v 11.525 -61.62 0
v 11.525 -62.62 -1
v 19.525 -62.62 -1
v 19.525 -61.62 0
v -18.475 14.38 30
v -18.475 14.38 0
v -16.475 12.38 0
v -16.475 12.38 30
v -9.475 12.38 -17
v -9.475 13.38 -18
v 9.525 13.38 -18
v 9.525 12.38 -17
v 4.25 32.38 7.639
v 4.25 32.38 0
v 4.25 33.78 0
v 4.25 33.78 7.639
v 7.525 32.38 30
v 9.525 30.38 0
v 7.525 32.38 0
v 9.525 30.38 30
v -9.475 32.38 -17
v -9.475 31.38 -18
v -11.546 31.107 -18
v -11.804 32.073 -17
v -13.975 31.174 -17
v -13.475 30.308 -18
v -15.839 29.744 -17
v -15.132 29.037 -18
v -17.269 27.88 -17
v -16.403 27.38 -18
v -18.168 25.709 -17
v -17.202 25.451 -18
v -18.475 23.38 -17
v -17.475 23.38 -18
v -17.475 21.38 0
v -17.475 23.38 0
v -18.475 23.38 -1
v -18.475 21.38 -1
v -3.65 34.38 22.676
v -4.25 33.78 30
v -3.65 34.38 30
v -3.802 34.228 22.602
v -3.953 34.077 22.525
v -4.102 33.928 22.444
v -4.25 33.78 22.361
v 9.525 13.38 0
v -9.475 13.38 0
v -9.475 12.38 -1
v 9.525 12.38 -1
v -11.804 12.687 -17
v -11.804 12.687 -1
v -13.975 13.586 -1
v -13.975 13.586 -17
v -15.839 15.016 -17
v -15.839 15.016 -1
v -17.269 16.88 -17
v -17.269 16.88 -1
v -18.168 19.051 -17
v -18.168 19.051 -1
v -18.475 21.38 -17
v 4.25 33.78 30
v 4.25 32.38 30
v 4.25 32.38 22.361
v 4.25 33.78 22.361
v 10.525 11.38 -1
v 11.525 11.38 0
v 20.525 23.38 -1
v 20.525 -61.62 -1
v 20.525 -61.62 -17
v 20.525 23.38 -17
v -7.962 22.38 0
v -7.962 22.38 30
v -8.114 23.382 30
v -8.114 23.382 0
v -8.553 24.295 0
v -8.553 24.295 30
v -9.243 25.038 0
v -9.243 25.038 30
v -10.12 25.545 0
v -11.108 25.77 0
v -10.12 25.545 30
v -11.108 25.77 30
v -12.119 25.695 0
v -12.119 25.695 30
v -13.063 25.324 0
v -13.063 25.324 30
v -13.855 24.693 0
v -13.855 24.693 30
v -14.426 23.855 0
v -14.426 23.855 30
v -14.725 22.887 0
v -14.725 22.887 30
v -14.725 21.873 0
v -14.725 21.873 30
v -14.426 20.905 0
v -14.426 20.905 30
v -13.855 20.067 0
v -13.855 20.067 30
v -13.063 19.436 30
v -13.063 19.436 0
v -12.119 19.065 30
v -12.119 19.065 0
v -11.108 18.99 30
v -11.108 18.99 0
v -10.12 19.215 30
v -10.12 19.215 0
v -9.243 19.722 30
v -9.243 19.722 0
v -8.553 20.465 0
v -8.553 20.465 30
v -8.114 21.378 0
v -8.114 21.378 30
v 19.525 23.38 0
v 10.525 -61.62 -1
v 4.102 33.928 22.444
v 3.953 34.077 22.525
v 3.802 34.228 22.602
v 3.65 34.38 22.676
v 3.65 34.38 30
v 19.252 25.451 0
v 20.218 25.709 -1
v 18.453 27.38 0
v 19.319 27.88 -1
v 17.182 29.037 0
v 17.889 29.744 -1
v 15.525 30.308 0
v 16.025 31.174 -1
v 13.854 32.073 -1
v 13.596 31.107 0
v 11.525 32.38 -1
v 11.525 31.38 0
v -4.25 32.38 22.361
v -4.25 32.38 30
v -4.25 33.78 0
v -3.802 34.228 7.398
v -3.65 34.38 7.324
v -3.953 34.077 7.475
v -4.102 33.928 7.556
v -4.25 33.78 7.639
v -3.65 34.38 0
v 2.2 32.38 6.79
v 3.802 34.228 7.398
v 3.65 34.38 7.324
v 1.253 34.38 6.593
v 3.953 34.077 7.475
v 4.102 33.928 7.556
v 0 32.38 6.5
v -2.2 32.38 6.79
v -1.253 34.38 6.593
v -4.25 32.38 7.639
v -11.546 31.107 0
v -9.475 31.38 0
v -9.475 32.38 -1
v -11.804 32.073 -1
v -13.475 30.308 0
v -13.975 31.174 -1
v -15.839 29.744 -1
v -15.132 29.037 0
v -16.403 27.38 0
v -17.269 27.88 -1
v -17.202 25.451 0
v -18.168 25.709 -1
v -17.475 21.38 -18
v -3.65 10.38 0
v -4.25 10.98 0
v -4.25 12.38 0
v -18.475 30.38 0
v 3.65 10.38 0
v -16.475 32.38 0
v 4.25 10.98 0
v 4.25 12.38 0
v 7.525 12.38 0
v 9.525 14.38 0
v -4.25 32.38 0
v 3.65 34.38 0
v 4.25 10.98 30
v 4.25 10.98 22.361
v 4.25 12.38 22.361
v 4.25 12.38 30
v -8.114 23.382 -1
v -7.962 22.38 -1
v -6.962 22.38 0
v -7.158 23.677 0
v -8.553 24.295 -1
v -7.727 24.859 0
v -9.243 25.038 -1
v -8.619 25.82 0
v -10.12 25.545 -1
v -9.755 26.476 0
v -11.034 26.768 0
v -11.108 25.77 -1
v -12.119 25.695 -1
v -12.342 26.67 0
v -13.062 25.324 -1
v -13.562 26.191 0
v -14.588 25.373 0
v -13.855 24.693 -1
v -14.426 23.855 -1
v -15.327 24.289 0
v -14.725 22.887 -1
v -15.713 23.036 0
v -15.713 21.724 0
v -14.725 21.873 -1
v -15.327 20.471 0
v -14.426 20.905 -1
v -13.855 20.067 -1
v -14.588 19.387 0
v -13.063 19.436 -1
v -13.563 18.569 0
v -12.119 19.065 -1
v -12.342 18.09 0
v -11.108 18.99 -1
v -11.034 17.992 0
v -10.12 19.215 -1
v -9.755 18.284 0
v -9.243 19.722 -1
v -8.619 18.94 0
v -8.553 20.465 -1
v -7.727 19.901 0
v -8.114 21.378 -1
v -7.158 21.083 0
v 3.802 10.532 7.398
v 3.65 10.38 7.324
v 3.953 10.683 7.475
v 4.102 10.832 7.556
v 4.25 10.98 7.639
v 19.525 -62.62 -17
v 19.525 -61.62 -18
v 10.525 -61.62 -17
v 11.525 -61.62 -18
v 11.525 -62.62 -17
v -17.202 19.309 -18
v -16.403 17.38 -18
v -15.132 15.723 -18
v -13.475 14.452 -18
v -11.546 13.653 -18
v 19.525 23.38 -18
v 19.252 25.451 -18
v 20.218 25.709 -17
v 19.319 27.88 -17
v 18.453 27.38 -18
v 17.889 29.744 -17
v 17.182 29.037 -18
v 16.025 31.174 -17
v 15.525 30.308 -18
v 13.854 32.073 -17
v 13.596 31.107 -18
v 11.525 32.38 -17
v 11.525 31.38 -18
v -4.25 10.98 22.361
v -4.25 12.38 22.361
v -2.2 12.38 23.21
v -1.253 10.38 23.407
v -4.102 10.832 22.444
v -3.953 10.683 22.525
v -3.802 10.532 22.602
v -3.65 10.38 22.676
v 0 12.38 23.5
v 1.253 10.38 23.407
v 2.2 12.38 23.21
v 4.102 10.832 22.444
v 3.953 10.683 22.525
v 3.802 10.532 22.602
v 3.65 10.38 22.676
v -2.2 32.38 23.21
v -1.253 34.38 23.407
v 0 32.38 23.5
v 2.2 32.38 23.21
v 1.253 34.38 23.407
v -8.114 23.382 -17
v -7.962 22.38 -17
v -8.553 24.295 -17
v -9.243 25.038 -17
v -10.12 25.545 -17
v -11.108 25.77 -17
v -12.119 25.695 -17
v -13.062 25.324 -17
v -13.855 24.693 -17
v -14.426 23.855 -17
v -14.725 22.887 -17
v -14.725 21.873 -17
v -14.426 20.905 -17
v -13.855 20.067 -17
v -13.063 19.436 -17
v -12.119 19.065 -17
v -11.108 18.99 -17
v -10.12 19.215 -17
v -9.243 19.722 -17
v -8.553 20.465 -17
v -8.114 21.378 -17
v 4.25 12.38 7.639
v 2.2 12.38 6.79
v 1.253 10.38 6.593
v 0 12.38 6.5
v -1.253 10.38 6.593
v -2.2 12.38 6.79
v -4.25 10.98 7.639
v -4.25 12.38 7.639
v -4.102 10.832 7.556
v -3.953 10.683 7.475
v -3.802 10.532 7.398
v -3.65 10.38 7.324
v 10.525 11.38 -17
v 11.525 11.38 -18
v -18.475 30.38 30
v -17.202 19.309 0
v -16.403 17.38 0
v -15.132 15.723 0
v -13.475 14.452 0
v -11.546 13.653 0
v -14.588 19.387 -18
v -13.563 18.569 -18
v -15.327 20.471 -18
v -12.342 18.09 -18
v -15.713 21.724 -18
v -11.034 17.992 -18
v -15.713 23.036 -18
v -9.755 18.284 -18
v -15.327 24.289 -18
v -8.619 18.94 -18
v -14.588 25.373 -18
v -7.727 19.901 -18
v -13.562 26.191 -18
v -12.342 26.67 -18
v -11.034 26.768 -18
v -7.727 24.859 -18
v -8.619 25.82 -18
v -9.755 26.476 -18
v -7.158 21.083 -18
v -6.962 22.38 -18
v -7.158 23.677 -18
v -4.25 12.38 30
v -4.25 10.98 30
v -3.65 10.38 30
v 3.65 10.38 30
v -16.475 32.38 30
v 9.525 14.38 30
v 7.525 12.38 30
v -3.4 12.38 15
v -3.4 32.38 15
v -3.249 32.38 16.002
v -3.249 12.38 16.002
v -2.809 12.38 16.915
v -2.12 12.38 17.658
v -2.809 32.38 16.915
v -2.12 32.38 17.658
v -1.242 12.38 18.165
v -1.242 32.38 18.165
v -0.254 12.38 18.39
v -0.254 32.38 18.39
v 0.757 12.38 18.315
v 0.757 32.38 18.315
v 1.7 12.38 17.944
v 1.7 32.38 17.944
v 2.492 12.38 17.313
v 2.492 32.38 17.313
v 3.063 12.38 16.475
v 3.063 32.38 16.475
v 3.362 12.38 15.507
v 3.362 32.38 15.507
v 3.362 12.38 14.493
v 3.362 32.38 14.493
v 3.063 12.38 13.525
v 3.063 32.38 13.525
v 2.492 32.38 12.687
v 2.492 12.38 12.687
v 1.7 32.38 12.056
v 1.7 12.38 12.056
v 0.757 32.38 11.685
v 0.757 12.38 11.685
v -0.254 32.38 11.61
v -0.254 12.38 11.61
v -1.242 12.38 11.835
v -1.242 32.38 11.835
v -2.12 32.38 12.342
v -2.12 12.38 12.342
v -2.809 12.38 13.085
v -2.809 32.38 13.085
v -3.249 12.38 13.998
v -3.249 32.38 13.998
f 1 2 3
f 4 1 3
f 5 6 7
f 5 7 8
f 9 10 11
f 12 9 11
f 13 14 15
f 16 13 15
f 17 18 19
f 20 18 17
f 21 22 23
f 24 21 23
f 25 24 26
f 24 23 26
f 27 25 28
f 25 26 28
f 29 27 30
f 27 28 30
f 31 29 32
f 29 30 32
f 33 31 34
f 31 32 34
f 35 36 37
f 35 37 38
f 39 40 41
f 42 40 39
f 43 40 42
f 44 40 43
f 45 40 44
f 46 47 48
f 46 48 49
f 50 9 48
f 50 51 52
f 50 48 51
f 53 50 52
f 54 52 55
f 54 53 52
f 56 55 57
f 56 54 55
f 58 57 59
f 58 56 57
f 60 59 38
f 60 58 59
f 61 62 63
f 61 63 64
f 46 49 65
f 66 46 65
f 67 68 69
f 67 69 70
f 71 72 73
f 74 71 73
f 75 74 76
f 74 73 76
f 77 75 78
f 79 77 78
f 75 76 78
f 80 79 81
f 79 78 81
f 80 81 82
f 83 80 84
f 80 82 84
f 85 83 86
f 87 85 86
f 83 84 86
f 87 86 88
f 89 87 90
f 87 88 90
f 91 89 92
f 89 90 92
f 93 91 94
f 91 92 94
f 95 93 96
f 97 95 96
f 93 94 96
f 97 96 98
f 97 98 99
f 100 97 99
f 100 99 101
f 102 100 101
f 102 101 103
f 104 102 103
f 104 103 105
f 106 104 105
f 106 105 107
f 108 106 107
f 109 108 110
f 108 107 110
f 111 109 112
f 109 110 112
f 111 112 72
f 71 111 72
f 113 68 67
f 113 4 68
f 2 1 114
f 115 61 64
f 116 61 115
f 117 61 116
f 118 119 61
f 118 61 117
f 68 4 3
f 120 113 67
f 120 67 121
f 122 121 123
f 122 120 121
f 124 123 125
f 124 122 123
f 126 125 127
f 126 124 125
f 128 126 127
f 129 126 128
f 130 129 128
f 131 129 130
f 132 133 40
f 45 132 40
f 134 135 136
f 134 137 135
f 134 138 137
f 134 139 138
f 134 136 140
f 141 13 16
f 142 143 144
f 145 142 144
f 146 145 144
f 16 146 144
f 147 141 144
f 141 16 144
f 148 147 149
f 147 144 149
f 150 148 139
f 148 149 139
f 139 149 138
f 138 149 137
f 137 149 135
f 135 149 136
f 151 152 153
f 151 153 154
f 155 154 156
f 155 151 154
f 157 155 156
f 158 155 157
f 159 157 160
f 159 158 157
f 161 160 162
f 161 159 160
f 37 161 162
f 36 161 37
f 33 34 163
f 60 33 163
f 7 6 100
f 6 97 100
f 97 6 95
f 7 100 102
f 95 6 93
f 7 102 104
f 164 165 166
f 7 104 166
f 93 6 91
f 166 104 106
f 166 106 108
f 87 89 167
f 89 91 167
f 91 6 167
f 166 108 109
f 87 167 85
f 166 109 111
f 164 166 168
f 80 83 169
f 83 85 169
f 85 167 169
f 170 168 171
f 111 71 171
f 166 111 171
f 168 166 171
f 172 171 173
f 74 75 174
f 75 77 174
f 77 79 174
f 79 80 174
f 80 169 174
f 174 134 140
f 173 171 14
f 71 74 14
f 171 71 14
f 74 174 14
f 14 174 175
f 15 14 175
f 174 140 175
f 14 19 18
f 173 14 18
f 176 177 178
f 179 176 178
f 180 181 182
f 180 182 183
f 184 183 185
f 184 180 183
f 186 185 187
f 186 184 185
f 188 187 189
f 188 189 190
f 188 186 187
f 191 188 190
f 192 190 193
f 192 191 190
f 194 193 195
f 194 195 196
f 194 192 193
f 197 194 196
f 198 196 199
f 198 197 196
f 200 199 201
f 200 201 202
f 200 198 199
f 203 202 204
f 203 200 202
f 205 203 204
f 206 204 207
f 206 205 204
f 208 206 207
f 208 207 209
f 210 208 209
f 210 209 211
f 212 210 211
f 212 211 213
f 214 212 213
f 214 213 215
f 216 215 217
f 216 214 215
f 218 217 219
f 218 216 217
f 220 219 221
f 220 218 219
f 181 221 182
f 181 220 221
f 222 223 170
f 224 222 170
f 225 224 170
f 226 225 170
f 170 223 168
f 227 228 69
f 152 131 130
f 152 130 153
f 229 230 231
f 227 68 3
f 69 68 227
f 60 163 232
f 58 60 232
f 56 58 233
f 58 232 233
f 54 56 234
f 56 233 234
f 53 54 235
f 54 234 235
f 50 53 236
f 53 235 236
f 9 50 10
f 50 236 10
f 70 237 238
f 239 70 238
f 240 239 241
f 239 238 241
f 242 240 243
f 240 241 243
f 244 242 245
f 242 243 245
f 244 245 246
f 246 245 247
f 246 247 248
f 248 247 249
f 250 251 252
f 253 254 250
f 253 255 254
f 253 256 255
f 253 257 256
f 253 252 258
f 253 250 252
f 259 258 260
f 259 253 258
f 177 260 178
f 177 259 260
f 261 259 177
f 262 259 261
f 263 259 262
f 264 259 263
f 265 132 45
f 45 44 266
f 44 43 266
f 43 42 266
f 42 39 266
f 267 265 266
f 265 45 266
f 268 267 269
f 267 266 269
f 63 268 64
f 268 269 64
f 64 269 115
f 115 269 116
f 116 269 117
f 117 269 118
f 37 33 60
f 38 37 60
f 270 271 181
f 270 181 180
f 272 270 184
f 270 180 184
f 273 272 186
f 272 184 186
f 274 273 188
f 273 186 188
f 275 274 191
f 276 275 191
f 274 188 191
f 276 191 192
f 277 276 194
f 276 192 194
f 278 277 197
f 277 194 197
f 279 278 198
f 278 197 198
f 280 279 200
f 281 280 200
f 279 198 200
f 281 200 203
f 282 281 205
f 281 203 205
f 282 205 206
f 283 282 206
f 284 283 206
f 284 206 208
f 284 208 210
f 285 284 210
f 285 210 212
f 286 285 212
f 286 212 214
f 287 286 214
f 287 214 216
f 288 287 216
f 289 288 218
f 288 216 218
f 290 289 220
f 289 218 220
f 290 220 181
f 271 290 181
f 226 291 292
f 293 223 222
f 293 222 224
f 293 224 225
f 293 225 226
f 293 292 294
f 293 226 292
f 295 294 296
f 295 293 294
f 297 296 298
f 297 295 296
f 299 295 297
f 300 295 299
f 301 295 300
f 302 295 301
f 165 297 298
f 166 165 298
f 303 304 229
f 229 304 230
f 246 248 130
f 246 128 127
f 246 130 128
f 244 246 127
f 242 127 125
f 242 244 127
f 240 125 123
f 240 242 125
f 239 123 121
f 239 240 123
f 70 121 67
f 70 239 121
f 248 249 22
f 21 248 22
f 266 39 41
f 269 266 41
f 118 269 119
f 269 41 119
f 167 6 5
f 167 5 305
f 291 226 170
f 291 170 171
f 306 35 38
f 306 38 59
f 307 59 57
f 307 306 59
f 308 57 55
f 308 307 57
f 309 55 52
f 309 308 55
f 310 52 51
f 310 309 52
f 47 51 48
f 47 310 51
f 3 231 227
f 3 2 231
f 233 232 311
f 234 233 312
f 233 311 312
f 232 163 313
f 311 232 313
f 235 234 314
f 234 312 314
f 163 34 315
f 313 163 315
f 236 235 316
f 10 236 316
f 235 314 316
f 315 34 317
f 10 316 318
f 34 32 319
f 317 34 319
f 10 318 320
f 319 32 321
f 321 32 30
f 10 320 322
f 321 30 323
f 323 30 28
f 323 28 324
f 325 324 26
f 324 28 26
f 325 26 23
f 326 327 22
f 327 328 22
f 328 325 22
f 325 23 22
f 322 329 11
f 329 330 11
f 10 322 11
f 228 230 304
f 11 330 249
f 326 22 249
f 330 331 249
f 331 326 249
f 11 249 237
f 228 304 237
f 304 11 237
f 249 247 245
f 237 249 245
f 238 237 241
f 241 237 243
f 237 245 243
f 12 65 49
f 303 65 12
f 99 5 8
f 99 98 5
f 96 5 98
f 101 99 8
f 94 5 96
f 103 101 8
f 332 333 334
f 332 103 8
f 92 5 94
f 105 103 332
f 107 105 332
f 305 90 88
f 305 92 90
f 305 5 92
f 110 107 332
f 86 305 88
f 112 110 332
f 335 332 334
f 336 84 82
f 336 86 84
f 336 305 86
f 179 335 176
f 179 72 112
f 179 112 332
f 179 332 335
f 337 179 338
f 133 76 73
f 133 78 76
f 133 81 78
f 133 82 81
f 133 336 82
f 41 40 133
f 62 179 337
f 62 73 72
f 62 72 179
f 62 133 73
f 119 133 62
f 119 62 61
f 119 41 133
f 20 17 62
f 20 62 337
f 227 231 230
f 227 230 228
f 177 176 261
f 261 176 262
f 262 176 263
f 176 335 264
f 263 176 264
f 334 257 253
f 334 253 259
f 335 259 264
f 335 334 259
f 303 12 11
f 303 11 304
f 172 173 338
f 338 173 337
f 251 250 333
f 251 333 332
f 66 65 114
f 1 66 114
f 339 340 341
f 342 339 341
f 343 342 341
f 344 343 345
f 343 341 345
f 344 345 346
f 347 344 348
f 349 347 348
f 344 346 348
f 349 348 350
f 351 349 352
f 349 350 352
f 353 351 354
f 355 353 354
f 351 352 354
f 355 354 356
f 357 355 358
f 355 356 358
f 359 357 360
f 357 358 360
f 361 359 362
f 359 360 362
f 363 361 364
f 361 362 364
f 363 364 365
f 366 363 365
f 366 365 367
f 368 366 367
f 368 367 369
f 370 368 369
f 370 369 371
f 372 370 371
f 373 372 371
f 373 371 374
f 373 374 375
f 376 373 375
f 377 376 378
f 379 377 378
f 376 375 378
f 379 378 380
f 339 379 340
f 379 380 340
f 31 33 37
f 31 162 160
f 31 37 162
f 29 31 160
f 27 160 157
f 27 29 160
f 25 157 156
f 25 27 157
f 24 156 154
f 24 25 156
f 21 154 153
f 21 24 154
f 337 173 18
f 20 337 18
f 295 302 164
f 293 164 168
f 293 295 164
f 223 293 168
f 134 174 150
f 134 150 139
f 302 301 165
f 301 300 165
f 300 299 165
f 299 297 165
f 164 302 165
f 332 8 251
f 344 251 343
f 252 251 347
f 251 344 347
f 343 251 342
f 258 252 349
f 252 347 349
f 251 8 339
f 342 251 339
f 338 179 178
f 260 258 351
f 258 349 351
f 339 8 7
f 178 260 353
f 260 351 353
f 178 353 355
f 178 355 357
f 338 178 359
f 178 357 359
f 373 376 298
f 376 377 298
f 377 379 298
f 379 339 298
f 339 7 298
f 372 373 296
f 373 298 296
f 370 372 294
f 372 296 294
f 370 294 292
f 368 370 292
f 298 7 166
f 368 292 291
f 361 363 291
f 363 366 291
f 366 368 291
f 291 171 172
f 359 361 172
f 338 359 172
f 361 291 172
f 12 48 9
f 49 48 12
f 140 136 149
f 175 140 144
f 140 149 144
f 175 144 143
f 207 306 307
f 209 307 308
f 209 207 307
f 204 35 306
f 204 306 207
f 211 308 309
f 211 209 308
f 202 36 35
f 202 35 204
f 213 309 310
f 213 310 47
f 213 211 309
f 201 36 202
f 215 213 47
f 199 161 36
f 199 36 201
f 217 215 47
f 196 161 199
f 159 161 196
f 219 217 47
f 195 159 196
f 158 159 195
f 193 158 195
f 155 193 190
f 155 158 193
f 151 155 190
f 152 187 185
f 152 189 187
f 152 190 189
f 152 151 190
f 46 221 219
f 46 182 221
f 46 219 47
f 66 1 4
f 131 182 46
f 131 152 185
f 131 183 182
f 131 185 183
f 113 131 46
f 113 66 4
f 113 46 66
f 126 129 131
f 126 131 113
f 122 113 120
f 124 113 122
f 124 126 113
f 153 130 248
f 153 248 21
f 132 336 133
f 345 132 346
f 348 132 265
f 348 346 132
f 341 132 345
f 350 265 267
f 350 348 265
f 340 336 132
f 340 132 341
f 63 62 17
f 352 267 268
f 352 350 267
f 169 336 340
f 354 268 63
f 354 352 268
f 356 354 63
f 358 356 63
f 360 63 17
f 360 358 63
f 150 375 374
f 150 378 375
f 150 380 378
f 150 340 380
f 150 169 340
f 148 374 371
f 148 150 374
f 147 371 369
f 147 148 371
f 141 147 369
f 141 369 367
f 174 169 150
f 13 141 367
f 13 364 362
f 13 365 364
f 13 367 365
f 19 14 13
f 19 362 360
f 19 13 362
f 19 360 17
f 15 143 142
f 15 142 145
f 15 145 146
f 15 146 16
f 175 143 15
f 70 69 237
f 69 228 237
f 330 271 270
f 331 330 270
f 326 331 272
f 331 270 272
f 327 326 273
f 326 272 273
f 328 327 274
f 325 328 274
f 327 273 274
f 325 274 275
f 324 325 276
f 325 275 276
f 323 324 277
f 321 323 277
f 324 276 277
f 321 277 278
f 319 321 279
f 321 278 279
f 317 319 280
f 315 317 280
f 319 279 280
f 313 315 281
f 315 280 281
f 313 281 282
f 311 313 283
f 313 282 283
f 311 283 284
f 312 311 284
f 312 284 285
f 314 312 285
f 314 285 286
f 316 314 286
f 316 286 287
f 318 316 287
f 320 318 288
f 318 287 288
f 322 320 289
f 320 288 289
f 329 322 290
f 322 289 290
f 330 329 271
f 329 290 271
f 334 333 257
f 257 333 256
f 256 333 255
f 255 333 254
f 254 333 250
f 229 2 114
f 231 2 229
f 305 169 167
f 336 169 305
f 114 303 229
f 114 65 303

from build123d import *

# Parameters (mm, degrees)
SKETCH021_W     = 28
SKETCH021_H     = 20
PAD006_DEPTH    = 30
SKETCH022_W     = 8.5
SKETCH022_H     = 24
PAD007_DEPTH    = 30
CHAMFER006_SIZE = 2
CHAMFER007_SIZE = 0.6
SKETCH023_R     = 8.5
POCKET009_DEPTH = 2
SKETCH024_R     = 8.5
POCKET010_DEPTH = 2
SKETCH025_R     = 3.4
POCKET011_DEPTH = 20
SKETCH026_R     = 3.4
POCKET012_DEPTH = 30
SKETCH028_R     = 3.4
PAD008_DEPTH    = 18
FILLET002_R     = 9
CHAMFER008_SIZE = 1


with BuildPart() as carrier003:
    # Sketch021 → Pad006 (new body)
    with BuildSketch(Plane.XY):
        with Locations((-4.475, 22.38)):
            Rectangle(SKETCH021_W, SKETCH021_H)
    extrude(amount=PAD006_DEPTH)

    # Sketch022 (on Face6 of Pad006) → Pad007 (join)
    with BuildSketch(Plane.XY.offset(30)):
        with Locations((0, 22.38)):
            Rectangle(SKETCH022_W, SKETCH022_H)
    extrude(amount=-PAD007_DEPTH)

    # Chamfer006
    chamfer006_edges = [carrier003.edges().sort_by_distance(p)[0] for p in [
        (-18.475, 32.38, 15),
        (-18.475, 12.38, 15),
        (9.525, 32.38, 15),
        (9.525, 12.38, 15),
    ]]
    chamfer(chamfer006_edges, length=CHAMFER006_SIZE)

    # Chamfer007
    chamfer007_edges = [carrier003.edges().sort_by_distance(p)[0] for p in [
        (4.25, 34.38, 15),
        (-4.25, 34.38, 15),
        (-4.25, 10.38, 15),
        (4.25, 10.38, 15),
    ]]
    chamfer(chamfer007_edges, length=CHAMFER007_SIZE)

    # Sketch023 (on Face10 of Pad007) → Pocket009 (cut)
    with BuildSketch(Plane(origin=(0, 34.38, 0), x_dir=(-1, 0, 0), z_dir=(0, 1, 0))):
        with Locations((0, 15)):
            Circle(SKETCH023_R)
    extrude(amount=-POCKET009_DEPTH, mode=Mode.SUBTRACT)

    # Sketch024 (on Face10 of Pad007) → Pocket010 (cut)
    with BuildSketch(Plane(origin=(0, 10.38, 0), x_dir=(-1, 0, 0), z_dir=(0, 1, 0))):
        with Locations((0, 15)):
            Circle(SKETCH024_R)
    extrude(amount=POCKET010_DEPTH, mode=Mode.SUBTRACT)

    # Sketch025 (on Face3 of Pocket010) → Pocket011 (cut)
    with BuildSketch(Plane(origin=(0, 32.38, 0), x_dir=(-1, 0, 0), z_dir=(0, 1, 0))):
        with Locations((0, 15)):
            Circle(SKETCH025_R)
    extrude(amount=-POCKET011_DEPTH, mode=Mode.SUBTRACT)

    # Sketch026 (on Face13 of Pocket011) → Pocket012 (cut)
    with BuildSketch(Plane.XY.offset(30)):
        with Locations((-11.3625, 22.38)):
            Circle(SKETCH026_R)
    extrude(amount=-POCKET012_DEPTH, mode=Mode.SUBTRACT)


with BuildPart() as arm003:
    # Sketch028 → Pad008 (new body)
    with BuildSketch(Plane.XY):
        Polygon((-18.475, 12.38), (10.525, 12.38), (10.525, -62.62), (20.525, -62.62), (20.525, 32.38), (-18.475, 32.38), align=None)
        with Locations((-11.3625, 22.38)):
            Circle(SKETCH028_R, mode=Mode.SUBTRACT)
    extrude(amount=-PAD008_DEPTH)

    # Fillet002
    fillet002_edges = [arm003.edges().sort_by_distance(p)[0] for p in [
        (-18.475, 32.38, -9),
        (-18.475, 12.38, -9),
        (20.525, 32.38, -9),
    ]]
    fillet(fillet002_edges, radius=FILLET002_R)

    # Chamfer008
    chamfer008_edges = [arm003.edges().sort_by_distance(p)[0] for p in [
        (0.525, 12.38, -18),
        (-15.838961, 15.016039, -18),
        (10.525, -25.12, -18),
        (-18.475, 22.38, -18),
        (15.525, -62.62, -18),
        (-15.838961, 29.743961, -18),
        (20.525, -19.62, -18),
        (1.025, 32.38, -18),
        (17.888961, 29.743961, -18),
        (-14.7625, 22.38, -18),
        (0.525, 12.38, 0),
        (-15.838961, 15.016039, 0),
        (10.525, -25.12, 0),
        (-18.475, 22.38, 0),
        (15.525, -62.62, 0),
        (-15.838961, 29.743961, 0),
        (20.525, -19.62, 0),
        (1.025, 32.38, 0),
        (17.888961, 29.743961, 0),
        (-14.7625, 22.38, 0),
        (10.525, -62.62, -9),
        (20.525, -62.62, -9),
        (10.525, 12.38, -9),
    ]]
    chamfer(chamfer008_edges, length=CHAMFER008_SIZE)


solid = Compound([carrier003.part, arm003.part])
